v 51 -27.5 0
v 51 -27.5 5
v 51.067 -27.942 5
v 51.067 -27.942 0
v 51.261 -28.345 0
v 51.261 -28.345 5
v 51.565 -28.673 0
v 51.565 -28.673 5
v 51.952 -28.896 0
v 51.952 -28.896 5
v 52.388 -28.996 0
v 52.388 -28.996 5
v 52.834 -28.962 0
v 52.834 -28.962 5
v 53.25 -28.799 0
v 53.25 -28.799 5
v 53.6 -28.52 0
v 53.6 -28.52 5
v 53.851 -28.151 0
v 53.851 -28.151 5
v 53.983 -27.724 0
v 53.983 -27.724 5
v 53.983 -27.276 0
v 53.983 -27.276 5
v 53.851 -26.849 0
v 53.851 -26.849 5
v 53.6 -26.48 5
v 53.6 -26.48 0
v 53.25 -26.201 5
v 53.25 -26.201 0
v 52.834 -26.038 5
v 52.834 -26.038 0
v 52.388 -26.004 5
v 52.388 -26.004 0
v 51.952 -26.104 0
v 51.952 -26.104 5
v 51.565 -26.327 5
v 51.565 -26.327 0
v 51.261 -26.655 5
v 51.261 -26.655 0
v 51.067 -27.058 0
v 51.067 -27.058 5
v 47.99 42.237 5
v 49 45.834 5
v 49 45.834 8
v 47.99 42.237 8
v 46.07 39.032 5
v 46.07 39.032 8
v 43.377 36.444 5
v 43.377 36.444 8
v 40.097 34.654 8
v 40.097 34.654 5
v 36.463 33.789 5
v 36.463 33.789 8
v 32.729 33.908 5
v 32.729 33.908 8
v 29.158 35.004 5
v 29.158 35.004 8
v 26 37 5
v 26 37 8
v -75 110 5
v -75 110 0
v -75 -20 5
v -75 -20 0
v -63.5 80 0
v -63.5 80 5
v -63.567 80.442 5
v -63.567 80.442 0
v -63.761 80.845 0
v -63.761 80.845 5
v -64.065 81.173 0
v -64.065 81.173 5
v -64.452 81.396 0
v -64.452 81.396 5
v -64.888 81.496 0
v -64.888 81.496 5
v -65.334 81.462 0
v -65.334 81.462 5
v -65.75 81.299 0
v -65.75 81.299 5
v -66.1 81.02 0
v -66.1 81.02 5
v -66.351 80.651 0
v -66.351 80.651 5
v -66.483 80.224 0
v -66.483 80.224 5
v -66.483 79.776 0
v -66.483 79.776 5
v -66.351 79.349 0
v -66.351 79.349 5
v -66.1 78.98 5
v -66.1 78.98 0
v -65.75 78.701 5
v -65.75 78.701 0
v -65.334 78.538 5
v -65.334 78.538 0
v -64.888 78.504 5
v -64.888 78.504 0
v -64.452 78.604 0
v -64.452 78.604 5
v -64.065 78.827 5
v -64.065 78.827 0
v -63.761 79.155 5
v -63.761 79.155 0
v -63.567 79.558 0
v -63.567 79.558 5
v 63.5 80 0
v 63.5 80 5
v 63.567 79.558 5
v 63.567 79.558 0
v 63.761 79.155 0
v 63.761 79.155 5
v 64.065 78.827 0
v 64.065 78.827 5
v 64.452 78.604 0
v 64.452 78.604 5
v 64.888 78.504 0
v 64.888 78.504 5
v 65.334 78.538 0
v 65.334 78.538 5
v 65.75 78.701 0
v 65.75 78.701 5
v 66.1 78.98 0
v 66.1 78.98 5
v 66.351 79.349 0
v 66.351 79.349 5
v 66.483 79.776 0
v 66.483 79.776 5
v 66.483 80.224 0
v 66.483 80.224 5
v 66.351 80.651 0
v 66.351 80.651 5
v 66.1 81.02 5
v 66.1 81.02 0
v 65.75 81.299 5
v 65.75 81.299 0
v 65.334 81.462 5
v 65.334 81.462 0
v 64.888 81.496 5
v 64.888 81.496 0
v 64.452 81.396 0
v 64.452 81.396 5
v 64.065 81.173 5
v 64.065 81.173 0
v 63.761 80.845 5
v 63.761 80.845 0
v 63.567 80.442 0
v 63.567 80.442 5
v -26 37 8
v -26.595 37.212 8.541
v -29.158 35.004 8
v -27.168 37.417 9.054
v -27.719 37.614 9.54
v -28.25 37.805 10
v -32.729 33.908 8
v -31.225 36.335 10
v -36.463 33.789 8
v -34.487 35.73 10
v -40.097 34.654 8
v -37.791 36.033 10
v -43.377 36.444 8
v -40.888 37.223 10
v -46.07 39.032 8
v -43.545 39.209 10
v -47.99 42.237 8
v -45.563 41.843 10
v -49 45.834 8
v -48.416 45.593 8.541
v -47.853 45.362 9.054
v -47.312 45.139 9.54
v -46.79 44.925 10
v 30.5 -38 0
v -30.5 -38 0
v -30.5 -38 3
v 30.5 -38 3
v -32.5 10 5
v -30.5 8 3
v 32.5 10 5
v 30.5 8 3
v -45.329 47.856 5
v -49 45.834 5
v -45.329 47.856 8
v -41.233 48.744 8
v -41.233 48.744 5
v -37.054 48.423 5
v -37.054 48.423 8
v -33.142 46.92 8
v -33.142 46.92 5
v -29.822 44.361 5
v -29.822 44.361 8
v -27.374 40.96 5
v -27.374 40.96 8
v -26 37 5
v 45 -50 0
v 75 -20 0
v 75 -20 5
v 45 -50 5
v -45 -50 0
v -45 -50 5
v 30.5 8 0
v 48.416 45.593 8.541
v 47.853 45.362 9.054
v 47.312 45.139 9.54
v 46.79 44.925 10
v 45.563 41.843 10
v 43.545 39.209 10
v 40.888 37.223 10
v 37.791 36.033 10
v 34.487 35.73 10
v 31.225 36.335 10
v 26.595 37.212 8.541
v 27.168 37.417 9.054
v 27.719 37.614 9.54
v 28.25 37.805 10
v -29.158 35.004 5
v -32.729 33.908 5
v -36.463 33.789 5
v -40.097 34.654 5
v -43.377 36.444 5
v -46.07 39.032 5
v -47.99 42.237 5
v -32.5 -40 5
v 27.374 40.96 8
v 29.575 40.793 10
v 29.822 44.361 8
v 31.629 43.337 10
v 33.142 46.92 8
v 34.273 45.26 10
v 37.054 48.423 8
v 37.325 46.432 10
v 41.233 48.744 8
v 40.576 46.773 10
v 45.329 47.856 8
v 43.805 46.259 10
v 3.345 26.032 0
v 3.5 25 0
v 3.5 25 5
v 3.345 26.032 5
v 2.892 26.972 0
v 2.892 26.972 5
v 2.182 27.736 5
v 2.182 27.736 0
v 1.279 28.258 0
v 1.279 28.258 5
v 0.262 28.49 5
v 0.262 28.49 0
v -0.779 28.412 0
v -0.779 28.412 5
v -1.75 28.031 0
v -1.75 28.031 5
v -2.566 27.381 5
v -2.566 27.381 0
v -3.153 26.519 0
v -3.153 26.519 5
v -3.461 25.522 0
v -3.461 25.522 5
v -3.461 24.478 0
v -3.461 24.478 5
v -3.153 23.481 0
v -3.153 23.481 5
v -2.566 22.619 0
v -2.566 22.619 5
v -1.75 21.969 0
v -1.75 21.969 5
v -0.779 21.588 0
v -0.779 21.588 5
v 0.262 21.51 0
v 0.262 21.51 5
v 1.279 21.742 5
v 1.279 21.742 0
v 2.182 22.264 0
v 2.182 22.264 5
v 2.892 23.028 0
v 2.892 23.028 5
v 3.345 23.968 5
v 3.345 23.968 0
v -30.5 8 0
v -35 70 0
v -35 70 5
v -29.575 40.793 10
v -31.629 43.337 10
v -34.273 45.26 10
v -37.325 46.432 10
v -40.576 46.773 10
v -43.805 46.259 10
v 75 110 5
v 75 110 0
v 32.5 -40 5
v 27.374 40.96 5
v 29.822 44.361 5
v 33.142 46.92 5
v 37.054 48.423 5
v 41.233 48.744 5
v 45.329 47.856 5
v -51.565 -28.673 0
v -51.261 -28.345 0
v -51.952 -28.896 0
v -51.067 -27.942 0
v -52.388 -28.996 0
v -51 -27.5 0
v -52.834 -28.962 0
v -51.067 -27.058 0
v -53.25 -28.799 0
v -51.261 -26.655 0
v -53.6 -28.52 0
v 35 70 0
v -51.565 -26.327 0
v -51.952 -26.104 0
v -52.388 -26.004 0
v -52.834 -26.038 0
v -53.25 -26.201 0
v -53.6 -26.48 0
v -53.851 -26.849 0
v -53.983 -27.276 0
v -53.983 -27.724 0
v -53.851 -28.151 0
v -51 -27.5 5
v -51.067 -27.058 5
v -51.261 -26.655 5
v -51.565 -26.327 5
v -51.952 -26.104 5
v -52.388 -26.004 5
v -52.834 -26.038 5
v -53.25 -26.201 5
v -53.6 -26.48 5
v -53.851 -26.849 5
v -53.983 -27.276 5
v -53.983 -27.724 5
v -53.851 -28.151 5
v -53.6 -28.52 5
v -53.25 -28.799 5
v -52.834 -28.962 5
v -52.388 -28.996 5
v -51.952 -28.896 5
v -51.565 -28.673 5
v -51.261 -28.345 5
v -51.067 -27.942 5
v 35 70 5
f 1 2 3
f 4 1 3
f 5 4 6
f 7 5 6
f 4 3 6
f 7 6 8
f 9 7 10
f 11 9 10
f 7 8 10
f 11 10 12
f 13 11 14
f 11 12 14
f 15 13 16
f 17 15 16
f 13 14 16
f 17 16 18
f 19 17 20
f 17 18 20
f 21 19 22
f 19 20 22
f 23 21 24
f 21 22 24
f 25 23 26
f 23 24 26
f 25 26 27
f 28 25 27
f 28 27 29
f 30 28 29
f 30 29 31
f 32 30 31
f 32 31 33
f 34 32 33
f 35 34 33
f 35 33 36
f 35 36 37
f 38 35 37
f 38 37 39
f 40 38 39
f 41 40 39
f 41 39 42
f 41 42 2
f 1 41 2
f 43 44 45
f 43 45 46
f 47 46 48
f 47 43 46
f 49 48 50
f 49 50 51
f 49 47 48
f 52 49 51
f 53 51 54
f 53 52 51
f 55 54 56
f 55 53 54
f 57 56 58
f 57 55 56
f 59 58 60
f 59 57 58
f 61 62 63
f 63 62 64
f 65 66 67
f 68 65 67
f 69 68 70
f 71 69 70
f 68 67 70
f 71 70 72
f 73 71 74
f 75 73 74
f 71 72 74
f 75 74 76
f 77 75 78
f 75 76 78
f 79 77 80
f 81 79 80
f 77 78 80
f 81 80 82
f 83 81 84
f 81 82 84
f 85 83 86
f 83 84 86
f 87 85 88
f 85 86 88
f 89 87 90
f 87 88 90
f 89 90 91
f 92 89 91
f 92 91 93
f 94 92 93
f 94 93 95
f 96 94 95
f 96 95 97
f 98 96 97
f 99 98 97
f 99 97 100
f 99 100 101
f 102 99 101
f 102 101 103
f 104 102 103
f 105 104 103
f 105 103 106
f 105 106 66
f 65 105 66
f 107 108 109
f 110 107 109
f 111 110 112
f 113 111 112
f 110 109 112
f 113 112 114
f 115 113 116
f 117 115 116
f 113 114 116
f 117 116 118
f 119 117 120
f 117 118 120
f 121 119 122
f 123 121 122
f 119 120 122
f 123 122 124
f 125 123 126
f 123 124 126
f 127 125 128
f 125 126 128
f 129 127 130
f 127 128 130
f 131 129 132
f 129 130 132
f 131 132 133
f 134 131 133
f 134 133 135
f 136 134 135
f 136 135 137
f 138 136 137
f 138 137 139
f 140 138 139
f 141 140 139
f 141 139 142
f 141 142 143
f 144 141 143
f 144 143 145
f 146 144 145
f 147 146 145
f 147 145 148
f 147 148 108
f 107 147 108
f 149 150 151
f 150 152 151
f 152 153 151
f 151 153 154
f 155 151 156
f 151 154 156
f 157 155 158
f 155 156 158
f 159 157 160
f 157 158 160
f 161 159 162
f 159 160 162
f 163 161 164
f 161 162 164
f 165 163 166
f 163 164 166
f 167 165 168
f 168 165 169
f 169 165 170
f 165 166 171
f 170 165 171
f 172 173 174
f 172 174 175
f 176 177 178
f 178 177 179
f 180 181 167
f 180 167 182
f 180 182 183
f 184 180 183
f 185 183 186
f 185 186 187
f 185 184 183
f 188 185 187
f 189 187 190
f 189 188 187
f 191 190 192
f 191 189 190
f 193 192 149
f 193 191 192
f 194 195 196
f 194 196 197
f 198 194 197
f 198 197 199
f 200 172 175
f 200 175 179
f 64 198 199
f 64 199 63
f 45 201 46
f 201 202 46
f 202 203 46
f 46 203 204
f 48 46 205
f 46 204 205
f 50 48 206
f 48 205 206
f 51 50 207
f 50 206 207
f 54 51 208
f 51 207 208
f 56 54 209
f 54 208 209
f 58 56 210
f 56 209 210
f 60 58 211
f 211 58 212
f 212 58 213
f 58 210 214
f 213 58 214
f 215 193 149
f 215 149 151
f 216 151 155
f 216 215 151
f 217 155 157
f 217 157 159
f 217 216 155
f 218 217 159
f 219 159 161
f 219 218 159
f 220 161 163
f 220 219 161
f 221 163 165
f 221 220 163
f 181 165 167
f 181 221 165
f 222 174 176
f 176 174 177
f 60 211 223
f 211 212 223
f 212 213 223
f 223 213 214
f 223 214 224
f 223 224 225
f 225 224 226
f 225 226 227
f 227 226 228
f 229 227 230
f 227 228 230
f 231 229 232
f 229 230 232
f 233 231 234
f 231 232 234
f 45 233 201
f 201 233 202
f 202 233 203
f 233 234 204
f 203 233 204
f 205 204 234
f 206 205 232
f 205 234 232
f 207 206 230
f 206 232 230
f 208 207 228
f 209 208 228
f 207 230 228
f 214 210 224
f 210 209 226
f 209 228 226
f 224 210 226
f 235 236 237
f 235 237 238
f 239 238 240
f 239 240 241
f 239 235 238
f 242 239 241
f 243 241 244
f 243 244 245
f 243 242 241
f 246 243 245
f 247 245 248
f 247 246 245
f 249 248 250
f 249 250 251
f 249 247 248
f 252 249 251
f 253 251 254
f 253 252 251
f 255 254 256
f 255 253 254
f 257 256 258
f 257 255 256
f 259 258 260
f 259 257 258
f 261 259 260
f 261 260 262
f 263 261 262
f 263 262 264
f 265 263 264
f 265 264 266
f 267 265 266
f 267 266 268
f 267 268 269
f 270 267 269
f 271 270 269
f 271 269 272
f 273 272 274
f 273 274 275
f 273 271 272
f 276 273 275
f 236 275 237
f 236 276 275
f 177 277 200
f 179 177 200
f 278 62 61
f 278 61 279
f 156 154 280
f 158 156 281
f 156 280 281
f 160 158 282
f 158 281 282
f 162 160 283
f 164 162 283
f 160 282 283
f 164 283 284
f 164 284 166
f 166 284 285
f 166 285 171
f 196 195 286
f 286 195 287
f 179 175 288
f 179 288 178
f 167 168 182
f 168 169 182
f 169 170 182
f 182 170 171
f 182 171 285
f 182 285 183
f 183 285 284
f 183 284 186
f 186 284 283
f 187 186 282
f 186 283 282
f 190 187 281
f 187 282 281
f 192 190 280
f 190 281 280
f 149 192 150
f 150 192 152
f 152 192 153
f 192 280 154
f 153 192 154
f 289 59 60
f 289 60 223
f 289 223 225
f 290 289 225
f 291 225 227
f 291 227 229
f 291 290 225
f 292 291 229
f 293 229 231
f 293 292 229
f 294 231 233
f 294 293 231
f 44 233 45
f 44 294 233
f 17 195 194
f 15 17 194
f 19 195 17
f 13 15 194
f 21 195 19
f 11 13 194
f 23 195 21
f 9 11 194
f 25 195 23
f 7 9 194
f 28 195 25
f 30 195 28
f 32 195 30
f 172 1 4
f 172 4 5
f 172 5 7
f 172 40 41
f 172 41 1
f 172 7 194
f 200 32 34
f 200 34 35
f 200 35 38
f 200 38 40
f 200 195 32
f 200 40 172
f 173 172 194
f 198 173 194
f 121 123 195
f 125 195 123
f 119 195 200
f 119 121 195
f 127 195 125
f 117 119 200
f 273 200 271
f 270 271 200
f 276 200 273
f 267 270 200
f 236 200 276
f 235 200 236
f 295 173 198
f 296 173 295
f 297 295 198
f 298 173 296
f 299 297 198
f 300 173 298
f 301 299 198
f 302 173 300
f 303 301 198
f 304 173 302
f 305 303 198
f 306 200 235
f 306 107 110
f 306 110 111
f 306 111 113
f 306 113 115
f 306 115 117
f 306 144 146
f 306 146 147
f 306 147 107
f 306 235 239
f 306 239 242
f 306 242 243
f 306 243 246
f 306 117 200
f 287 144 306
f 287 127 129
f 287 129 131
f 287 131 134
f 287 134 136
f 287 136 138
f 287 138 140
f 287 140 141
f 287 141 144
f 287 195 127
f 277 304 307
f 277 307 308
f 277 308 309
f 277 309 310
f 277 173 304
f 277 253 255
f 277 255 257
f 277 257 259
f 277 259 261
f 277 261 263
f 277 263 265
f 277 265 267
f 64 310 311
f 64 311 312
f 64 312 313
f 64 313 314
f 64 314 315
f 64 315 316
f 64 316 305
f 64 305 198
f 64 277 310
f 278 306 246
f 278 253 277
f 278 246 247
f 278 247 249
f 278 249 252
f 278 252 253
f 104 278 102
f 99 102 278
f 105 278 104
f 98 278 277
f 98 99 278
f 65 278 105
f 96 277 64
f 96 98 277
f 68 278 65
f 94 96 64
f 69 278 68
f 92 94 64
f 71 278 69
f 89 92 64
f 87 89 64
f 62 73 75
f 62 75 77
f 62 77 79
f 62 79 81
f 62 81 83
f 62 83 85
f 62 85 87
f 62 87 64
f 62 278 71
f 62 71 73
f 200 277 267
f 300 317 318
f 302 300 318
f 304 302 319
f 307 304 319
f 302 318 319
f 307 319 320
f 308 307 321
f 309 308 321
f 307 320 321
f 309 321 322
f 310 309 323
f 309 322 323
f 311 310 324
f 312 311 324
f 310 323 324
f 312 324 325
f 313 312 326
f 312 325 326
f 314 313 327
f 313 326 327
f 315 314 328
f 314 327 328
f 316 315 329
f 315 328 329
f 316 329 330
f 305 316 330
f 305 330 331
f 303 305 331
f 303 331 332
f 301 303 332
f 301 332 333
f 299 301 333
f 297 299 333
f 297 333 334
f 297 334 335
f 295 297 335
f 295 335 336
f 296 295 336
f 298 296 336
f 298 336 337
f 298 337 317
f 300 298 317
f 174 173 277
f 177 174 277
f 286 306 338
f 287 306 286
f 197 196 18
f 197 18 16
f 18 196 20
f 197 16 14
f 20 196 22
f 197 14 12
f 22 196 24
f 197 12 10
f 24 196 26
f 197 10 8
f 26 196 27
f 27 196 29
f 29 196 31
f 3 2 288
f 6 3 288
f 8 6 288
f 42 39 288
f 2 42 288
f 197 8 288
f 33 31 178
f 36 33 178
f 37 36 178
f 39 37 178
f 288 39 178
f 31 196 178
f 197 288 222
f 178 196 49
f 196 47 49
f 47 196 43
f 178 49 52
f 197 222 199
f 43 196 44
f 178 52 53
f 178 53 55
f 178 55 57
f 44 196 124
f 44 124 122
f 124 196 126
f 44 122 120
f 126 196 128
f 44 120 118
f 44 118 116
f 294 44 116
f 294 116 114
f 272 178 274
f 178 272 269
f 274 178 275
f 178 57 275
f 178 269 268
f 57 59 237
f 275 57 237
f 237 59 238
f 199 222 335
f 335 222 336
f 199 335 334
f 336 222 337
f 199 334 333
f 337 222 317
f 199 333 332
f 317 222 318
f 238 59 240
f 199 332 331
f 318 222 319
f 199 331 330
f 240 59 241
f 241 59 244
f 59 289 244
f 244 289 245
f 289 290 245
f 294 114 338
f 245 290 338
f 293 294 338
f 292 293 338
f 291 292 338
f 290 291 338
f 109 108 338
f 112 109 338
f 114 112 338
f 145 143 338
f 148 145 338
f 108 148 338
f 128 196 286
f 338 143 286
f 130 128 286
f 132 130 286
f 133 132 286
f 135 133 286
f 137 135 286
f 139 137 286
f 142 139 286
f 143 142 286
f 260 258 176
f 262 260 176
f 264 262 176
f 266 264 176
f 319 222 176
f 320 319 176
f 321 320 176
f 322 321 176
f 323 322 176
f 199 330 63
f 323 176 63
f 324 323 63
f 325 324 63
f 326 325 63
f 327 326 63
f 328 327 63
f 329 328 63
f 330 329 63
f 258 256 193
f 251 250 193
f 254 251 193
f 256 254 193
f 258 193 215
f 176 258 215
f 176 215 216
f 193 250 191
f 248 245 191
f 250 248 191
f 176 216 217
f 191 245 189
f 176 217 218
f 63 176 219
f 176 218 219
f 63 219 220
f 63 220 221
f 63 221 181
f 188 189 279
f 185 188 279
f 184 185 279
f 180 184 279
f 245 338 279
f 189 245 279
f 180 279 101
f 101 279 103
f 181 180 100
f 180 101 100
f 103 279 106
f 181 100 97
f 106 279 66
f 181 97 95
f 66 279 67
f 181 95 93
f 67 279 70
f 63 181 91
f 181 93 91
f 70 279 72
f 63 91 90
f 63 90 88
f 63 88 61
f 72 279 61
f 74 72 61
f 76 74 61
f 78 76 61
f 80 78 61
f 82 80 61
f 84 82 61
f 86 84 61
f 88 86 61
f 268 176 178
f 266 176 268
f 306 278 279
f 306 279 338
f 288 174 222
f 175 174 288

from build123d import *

# Parameters (mm, degrees)
IZIM1_R                          = 3.5
IZIM1_W                          = 61
IZIM1_H                          = 46
Y_KSEKLIK_EKSTR_ZYON1_DEPTH      = 5
Y_KSEKLIK_EKSTR_ZYON2_DEPTH      = 5
Y_KSEKLIK_EKSTR_ZYON2_DEPTH_BACK = 5
PAH1_SIZE                        = 2
PAH2_SIZE                        = 2
IZIM5_R                          = 1.5
KES_EKSTR_ZYON1_DEPTH            = 10


with BuildPart() as part:
    # Çizim1 → Yükseklik-Ekstrüzyon1 (new body)
    with BuildSketch(Plane.XY):
        Polygon((-75, 70), (-75, 110), (-35, 70), (35, 70), (75, 110), (75, 70), (75, -20), (45, -50), (-45, -50), (-75, -20), align=None)
        with Locations((0, 25)):
            Circle(IZIM1_R, mode=Mode.SUBTRACT)
        with Locations((0, -15)):
            Rectangle(IZIM1_W, IZIM1_H, mode=Mode.SUBTRACT)
        with BuildLine():
            ThreePointArc((-26, 37), (-35.043252773, 47.813379198), (-49, 45.833783979))
            ThreePointArc((-49, 45.833783979), (-40.097413612, 34.654160049), (-26, 37))
        make_face(mode=Mode.SUBTRACT)
        with BuildLine():
            ThreePointArc((26, 37), (40.097413612, 34.654160049), (49, 45.833783979))
            ThreePointArc((49, 45.833783979), (35.043252773, 47.813379198), (26, 37))
        make_face(mode=Mode.SUBTRACT)
    extrude(amount=Y_KSEKLIK_EKSTR_ZYON1_DEPTH)

    # Çizim3 → Yükseklik-Ekstrüzyon2 (add, two sides: drawn at the far end of the back side and taken through both)
    with BuildSketch(Plane.XY.offset(5).offset(-Y_KSEKLIK_EKSTR_ZYON2_DEPTH_BACK)):
        with BuildLine():
            ThreePointArc((-26, 37), (-40.097413612, 34.654160049), (-49, 45.833783979))
            ThreePointArc((-49, 45.833783979), (-35.043252773, 47.813379198), (-26, 37))
        make_face()
        with BuildLine():
            ThreePointArc((26, 37), (35.043252773, 47.813379198), (49, 45.833783979))
            ThreePointArc((49, 45.833783979), (40.097413612, 34.654160049), (26, 37))
        make_face()
    extrude(amount=Y_KSEKLIK_EKSTR_ZYON2_DEPTH + Y_KSEKLIK_EKSTR_ZYON2_DEPTH_BACK)

    # Pah1
    pah1_edges = [part.edges().sort_by_distance(p)[0] for p in [
        (-35.043252773, 47.813379198, 10),
        (-40.097413612, 34.654160049, 10),
        (40.097413612, 34.654160049, 10),
        (35.043252773, 47.813379198, 10),
    ]]
    chamfer(pah1_edges, length=PAH1_SIZE)

    # Pah2
    pah2_edges = [part.edges().sort_by_distance(p)[0] for p in [
        (30.5, -15, 5),
        (0, 8, 5),
        (-30.5, -15, 5),
        (0, -38, 5),
    ]]
    chamfer(pah2_edges, length=PAH2_SIZE)

    # Çizim5 → Kes-Ekstrüzyon1 (cut)
    with BuildSketch(Plane.XY.offset(5)):
        with Locations((-65, 80)):
            Circle(IZIM5_R)
        with Locations((-52.5, -27.5)):
            Circle(IZIM5_R)
        with Locations(Location((52.5, -27.5, 0), (0, 0, 180))):
            Circle(IZIM5_R)
        with Locations(Location((65, 80, 0), (0, 0, 180))):
            Circle(IZIM5_R)
    extrude(amount=-KES_EKSTR_ZYON1_DEPTH, mode=Mode.SUBTRACT)


solid = part.part
